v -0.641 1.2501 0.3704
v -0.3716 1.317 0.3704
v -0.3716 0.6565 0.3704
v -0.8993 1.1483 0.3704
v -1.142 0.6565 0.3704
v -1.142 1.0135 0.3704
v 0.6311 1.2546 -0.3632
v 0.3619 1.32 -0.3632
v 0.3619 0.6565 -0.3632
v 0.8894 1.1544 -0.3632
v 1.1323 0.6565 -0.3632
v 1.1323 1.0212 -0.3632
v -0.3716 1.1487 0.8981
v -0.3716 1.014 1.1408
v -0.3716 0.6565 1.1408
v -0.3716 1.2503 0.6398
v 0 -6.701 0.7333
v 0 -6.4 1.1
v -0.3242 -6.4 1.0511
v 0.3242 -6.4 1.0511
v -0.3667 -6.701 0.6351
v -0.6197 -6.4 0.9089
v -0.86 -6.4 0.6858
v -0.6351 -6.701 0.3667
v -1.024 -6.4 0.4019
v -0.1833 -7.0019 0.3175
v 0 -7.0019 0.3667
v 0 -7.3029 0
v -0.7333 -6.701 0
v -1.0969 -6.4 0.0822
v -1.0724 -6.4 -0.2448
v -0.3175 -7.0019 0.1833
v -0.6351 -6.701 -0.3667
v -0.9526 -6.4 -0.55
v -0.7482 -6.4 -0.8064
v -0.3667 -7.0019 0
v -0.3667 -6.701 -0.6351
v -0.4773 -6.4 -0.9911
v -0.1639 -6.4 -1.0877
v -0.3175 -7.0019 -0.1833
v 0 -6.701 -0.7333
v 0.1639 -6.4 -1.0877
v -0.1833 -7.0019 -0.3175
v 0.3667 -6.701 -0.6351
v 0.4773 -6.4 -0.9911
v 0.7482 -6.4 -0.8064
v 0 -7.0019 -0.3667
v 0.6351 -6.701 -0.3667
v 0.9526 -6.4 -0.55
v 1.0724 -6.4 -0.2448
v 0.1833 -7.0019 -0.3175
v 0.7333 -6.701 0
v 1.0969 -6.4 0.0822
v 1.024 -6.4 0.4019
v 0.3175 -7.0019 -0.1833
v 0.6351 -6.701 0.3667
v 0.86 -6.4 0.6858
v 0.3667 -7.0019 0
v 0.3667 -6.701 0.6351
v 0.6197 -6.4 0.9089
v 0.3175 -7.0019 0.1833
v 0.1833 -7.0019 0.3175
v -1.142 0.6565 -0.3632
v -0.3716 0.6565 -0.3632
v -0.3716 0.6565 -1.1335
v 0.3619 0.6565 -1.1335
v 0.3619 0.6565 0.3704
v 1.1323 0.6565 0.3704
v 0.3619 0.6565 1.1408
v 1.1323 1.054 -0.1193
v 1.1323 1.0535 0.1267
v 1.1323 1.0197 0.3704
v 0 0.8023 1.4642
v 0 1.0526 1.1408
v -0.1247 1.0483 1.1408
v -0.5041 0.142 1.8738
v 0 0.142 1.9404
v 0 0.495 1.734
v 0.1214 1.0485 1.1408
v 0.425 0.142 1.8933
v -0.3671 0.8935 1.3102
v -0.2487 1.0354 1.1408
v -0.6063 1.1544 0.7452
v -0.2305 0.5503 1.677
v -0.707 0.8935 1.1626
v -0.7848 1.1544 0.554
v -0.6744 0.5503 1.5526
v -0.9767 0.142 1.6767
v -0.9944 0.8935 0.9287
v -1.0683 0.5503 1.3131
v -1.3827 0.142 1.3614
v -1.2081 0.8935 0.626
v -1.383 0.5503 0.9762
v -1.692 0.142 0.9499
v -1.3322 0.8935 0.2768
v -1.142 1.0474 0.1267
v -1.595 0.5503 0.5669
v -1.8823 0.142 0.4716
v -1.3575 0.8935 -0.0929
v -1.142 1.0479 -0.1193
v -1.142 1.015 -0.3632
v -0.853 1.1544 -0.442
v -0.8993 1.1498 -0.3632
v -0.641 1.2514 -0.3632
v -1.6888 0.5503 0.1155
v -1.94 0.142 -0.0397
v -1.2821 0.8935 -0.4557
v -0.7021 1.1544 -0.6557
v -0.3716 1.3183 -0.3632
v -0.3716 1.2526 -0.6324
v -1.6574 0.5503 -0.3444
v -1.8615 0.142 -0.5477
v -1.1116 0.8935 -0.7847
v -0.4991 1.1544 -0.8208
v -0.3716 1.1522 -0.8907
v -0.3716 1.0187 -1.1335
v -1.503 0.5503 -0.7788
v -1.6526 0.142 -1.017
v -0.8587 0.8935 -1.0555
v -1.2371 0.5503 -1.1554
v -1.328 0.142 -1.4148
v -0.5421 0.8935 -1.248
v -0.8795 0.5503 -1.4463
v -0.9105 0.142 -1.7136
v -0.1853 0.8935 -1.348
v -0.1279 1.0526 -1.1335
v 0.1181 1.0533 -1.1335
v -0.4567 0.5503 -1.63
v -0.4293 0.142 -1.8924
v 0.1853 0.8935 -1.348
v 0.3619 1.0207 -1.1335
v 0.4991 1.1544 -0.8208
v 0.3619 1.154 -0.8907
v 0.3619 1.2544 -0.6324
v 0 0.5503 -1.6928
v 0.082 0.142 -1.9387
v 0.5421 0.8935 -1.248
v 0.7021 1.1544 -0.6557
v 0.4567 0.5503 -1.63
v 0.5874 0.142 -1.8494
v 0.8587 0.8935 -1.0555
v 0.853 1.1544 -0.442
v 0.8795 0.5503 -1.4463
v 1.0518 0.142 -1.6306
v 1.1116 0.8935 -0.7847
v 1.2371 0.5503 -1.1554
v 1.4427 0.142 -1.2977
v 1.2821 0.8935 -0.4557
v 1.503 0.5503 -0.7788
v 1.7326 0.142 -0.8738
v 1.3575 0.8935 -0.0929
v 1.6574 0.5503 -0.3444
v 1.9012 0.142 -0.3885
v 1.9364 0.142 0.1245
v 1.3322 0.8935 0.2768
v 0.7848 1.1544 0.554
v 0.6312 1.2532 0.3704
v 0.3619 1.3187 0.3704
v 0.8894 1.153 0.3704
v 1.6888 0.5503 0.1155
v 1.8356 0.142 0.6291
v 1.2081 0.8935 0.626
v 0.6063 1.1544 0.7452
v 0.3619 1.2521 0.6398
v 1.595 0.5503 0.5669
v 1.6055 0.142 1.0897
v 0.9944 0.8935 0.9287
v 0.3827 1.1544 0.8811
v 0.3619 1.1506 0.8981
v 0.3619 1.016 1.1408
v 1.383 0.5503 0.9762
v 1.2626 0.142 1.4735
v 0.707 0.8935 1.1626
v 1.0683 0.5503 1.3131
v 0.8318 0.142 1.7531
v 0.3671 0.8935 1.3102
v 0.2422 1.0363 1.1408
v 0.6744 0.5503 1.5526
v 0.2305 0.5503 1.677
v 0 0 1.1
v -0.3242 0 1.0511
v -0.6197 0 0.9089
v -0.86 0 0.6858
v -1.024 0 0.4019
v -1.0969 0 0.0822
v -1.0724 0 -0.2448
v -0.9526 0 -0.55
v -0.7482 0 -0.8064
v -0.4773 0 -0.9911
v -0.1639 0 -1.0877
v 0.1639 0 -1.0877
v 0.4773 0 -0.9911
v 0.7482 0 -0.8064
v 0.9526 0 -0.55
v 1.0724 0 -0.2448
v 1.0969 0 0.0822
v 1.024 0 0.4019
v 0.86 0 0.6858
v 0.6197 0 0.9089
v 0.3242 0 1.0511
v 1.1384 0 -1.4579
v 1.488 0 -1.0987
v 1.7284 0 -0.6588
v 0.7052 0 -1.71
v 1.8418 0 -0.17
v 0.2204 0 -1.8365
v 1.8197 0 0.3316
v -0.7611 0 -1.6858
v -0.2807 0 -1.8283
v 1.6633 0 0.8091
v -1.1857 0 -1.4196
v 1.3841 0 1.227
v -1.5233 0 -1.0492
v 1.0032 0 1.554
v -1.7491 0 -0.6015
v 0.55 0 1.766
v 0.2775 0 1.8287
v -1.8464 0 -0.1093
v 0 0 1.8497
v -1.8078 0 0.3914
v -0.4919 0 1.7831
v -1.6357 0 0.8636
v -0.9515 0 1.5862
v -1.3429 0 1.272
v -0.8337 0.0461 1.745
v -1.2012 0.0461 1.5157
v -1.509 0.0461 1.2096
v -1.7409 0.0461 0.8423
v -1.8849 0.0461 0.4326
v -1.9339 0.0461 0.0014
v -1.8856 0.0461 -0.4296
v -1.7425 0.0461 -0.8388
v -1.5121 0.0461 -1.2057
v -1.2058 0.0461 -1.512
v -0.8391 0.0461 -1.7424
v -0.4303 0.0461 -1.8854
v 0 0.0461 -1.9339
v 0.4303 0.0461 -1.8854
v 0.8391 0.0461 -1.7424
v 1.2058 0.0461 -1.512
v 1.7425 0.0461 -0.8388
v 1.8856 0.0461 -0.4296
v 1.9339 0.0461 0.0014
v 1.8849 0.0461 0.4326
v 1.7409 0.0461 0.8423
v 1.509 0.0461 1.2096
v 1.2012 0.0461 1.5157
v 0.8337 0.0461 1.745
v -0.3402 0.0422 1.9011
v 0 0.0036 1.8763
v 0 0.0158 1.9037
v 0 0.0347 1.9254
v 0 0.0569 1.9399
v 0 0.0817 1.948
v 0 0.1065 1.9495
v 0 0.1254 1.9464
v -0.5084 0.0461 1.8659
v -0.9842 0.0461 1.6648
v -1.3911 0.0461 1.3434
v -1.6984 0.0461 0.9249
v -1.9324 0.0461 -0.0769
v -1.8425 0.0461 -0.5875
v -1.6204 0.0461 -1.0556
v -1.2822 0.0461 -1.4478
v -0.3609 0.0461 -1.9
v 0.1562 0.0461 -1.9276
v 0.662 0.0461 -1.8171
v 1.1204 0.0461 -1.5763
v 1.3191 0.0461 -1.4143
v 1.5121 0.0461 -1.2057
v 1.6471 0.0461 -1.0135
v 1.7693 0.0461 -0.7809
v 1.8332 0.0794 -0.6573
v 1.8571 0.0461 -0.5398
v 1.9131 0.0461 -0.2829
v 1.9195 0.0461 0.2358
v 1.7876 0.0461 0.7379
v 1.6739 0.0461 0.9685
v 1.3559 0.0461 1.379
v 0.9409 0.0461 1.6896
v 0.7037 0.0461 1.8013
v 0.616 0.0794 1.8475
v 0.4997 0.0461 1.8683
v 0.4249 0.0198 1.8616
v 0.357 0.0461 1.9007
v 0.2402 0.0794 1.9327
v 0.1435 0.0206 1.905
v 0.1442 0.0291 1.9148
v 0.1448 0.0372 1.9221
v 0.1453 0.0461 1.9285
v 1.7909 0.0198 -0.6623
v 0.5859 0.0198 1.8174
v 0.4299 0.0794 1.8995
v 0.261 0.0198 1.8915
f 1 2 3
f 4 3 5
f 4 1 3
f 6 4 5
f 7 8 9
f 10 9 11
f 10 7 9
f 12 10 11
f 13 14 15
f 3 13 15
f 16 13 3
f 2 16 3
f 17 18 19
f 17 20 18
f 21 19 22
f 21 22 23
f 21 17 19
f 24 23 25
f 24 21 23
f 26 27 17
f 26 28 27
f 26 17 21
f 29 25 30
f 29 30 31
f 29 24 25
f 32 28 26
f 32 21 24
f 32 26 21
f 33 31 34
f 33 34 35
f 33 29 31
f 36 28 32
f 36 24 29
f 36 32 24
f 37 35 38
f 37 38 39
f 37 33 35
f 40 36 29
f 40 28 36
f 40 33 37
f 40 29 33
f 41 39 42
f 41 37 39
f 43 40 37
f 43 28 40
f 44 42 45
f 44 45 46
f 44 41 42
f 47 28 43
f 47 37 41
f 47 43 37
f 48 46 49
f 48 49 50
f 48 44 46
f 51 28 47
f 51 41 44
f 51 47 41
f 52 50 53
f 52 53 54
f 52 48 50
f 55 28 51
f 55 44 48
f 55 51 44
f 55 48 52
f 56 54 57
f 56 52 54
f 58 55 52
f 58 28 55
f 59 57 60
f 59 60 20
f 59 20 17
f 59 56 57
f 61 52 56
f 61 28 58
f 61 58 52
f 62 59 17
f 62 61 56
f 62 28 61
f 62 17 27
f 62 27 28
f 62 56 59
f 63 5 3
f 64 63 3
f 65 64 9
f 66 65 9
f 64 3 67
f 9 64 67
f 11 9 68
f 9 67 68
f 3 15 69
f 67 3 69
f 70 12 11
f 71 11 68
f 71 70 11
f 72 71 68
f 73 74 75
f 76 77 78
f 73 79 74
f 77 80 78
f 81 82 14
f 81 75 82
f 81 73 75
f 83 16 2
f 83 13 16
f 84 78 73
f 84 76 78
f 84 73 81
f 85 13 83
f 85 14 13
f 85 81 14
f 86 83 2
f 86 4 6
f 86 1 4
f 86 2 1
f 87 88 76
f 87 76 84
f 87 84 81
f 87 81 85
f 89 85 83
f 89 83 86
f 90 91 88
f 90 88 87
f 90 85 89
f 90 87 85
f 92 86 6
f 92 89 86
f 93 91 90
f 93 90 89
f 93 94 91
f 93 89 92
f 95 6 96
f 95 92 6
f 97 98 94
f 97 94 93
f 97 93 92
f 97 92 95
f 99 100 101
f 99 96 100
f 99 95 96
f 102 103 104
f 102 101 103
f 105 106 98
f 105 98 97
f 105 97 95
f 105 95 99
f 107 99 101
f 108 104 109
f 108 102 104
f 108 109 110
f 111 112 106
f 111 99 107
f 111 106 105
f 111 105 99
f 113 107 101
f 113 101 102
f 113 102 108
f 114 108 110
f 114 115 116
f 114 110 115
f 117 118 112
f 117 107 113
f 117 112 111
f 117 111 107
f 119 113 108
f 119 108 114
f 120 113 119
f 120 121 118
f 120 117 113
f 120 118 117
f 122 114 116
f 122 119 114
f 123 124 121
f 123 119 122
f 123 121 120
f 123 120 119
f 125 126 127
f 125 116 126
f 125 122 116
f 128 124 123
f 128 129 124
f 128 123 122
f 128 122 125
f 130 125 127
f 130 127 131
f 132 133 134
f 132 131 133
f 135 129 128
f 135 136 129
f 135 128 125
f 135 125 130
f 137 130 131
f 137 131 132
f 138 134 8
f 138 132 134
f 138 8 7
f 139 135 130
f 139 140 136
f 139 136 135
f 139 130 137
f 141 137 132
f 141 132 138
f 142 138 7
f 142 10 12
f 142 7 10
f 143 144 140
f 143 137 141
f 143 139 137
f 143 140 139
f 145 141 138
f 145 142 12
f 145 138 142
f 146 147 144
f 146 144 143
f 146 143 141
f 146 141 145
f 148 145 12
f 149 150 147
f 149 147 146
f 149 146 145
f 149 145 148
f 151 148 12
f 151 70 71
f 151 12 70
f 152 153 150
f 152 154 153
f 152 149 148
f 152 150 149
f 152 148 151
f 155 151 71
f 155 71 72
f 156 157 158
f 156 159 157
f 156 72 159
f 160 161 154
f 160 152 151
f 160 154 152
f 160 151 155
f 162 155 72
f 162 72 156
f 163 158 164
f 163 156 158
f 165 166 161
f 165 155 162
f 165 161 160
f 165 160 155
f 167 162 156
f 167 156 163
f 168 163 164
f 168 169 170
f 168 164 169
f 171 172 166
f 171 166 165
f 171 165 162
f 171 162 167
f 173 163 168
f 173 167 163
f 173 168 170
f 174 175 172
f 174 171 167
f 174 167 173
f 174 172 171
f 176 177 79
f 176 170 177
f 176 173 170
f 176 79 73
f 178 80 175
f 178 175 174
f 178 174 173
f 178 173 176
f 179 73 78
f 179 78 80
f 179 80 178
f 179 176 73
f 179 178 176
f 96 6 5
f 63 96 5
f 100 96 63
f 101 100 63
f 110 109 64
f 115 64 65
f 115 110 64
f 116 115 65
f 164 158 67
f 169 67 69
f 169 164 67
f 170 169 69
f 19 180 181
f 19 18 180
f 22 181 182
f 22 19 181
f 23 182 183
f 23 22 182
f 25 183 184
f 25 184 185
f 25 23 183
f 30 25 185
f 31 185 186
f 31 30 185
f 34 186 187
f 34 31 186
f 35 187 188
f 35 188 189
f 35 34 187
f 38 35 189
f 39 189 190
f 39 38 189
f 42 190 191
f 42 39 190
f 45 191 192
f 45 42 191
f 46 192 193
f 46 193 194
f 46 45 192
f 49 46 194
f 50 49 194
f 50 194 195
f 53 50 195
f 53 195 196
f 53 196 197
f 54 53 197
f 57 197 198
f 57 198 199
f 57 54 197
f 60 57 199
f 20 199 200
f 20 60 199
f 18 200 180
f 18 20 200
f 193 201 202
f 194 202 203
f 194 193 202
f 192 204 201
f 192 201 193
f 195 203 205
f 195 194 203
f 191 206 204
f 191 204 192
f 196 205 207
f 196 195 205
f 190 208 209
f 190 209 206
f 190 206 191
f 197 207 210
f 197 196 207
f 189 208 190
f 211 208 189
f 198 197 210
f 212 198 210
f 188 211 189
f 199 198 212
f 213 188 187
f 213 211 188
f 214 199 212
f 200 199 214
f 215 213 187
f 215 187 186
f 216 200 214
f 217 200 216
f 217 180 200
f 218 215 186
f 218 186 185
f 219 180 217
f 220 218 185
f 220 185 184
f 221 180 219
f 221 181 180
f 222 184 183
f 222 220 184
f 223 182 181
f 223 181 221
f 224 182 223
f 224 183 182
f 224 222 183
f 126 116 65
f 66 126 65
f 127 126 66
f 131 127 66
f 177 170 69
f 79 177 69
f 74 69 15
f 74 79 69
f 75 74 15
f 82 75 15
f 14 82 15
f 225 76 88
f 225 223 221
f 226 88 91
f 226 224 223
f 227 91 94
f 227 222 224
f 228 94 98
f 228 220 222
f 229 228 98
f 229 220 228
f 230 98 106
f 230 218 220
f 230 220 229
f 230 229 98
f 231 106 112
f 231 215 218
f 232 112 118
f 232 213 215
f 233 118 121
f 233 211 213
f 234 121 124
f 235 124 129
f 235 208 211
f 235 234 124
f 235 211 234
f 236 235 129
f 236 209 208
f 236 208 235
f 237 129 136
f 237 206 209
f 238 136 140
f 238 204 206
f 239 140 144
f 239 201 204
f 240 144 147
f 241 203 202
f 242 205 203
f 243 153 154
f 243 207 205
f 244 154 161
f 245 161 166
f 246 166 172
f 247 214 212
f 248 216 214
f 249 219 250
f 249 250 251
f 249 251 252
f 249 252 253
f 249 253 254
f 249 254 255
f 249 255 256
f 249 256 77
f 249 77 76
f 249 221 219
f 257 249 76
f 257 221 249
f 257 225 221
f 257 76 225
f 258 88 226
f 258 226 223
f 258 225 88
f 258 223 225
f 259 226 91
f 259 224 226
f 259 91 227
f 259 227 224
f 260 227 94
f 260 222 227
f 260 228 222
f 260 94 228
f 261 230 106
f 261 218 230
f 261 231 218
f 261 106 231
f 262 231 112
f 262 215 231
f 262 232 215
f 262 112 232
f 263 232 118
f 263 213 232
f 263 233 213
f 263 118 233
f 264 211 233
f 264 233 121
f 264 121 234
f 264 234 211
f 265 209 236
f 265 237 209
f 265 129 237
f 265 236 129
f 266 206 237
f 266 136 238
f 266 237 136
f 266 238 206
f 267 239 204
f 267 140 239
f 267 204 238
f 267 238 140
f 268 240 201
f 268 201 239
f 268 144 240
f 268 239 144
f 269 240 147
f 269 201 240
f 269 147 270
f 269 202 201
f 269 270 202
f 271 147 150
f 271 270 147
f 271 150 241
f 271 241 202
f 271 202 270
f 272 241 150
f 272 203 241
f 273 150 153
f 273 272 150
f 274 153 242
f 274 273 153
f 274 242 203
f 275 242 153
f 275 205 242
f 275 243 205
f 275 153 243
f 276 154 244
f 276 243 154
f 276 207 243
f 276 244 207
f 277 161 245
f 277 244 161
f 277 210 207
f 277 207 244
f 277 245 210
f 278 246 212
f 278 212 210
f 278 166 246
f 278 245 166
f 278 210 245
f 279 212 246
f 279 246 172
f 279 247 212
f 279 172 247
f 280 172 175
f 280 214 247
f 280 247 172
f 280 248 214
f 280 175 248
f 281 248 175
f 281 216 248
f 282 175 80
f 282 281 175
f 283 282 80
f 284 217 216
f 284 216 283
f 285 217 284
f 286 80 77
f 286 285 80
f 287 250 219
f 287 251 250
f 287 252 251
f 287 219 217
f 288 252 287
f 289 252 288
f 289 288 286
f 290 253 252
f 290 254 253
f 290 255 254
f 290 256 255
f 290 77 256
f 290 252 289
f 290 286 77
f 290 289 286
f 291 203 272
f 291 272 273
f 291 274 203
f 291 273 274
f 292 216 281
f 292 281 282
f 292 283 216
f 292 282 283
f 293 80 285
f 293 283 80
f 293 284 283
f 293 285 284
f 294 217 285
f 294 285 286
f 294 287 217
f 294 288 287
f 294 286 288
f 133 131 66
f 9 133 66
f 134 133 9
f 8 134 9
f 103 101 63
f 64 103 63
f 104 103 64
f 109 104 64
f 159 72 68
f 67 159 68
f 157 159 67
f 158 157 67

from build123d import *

# Parameters (mm, degrees)
CONG_1_R                = 0.1
ENL_V_MAT_EXTRU_1_DEPTH = 0.5


with BuildPart() as part:
    # Esquisse1 → Révolution1 (revolve)
    with BuildSketch(Plane.XY, mode=Mode.PRIVATE) as r_volution1_sk:
        with BuildLine():
            Line((2, 0), (1.1, 0))
            Line((1.1, 0), (1.1, -6.4))
            Line((1.1, -6.4), (0, -7.302889311))
            Line((0, -7.302889311), (0, 1.382388101))
            ThreePointArc((0, 1.382388101), (1.215627087, 1.003157221), (2, 0))
        make_face()
    revolve(r_volution1_sk.sketch.rotate(Axis((0, 3.800054794, 0), (0, -1, 0)), 90), axis=Axis((0, 3.800054794, 0), (0, -1, 0)))

    # Congé1
    cong_1_edges = [part.edges().sort_by_distance(p)[0] for p in [
        (0, 0, -2),
    ]]
    fillet(cong_1_edges, radius=CONG_1_R)

    # Esquisse2 → Enlèv. mat.-Extru.1 (cut, symmetric)
    with BuildSketch(Plane(origin=(0, 1.15653742, 0), x_dir=(-1, 0, 0), z_dir=(0, 1, 0))):
        Polygon((-0.361948003, 1.140760916), (0.37159995, 1.140760916), (0.37159995, 0.37038863), (1.141972235, 0.37038863), (1.141972235, -0.363159322), (0.37159995, -0.363159322), (0.37159995, -1.133531608), (-0.361948003, -1.133531608), (-0.361948003, -0.363159322), (-1.132320288, -0.363159322), (-1.132320288, 0.37038863), (-0.361948003, 0.37038863), align=None)
    extrude(amount=ENL_V_MAT_EXTRU_1_DEPTH, both=True, mode=Mode.SUBTRACT)


solid = part.part
